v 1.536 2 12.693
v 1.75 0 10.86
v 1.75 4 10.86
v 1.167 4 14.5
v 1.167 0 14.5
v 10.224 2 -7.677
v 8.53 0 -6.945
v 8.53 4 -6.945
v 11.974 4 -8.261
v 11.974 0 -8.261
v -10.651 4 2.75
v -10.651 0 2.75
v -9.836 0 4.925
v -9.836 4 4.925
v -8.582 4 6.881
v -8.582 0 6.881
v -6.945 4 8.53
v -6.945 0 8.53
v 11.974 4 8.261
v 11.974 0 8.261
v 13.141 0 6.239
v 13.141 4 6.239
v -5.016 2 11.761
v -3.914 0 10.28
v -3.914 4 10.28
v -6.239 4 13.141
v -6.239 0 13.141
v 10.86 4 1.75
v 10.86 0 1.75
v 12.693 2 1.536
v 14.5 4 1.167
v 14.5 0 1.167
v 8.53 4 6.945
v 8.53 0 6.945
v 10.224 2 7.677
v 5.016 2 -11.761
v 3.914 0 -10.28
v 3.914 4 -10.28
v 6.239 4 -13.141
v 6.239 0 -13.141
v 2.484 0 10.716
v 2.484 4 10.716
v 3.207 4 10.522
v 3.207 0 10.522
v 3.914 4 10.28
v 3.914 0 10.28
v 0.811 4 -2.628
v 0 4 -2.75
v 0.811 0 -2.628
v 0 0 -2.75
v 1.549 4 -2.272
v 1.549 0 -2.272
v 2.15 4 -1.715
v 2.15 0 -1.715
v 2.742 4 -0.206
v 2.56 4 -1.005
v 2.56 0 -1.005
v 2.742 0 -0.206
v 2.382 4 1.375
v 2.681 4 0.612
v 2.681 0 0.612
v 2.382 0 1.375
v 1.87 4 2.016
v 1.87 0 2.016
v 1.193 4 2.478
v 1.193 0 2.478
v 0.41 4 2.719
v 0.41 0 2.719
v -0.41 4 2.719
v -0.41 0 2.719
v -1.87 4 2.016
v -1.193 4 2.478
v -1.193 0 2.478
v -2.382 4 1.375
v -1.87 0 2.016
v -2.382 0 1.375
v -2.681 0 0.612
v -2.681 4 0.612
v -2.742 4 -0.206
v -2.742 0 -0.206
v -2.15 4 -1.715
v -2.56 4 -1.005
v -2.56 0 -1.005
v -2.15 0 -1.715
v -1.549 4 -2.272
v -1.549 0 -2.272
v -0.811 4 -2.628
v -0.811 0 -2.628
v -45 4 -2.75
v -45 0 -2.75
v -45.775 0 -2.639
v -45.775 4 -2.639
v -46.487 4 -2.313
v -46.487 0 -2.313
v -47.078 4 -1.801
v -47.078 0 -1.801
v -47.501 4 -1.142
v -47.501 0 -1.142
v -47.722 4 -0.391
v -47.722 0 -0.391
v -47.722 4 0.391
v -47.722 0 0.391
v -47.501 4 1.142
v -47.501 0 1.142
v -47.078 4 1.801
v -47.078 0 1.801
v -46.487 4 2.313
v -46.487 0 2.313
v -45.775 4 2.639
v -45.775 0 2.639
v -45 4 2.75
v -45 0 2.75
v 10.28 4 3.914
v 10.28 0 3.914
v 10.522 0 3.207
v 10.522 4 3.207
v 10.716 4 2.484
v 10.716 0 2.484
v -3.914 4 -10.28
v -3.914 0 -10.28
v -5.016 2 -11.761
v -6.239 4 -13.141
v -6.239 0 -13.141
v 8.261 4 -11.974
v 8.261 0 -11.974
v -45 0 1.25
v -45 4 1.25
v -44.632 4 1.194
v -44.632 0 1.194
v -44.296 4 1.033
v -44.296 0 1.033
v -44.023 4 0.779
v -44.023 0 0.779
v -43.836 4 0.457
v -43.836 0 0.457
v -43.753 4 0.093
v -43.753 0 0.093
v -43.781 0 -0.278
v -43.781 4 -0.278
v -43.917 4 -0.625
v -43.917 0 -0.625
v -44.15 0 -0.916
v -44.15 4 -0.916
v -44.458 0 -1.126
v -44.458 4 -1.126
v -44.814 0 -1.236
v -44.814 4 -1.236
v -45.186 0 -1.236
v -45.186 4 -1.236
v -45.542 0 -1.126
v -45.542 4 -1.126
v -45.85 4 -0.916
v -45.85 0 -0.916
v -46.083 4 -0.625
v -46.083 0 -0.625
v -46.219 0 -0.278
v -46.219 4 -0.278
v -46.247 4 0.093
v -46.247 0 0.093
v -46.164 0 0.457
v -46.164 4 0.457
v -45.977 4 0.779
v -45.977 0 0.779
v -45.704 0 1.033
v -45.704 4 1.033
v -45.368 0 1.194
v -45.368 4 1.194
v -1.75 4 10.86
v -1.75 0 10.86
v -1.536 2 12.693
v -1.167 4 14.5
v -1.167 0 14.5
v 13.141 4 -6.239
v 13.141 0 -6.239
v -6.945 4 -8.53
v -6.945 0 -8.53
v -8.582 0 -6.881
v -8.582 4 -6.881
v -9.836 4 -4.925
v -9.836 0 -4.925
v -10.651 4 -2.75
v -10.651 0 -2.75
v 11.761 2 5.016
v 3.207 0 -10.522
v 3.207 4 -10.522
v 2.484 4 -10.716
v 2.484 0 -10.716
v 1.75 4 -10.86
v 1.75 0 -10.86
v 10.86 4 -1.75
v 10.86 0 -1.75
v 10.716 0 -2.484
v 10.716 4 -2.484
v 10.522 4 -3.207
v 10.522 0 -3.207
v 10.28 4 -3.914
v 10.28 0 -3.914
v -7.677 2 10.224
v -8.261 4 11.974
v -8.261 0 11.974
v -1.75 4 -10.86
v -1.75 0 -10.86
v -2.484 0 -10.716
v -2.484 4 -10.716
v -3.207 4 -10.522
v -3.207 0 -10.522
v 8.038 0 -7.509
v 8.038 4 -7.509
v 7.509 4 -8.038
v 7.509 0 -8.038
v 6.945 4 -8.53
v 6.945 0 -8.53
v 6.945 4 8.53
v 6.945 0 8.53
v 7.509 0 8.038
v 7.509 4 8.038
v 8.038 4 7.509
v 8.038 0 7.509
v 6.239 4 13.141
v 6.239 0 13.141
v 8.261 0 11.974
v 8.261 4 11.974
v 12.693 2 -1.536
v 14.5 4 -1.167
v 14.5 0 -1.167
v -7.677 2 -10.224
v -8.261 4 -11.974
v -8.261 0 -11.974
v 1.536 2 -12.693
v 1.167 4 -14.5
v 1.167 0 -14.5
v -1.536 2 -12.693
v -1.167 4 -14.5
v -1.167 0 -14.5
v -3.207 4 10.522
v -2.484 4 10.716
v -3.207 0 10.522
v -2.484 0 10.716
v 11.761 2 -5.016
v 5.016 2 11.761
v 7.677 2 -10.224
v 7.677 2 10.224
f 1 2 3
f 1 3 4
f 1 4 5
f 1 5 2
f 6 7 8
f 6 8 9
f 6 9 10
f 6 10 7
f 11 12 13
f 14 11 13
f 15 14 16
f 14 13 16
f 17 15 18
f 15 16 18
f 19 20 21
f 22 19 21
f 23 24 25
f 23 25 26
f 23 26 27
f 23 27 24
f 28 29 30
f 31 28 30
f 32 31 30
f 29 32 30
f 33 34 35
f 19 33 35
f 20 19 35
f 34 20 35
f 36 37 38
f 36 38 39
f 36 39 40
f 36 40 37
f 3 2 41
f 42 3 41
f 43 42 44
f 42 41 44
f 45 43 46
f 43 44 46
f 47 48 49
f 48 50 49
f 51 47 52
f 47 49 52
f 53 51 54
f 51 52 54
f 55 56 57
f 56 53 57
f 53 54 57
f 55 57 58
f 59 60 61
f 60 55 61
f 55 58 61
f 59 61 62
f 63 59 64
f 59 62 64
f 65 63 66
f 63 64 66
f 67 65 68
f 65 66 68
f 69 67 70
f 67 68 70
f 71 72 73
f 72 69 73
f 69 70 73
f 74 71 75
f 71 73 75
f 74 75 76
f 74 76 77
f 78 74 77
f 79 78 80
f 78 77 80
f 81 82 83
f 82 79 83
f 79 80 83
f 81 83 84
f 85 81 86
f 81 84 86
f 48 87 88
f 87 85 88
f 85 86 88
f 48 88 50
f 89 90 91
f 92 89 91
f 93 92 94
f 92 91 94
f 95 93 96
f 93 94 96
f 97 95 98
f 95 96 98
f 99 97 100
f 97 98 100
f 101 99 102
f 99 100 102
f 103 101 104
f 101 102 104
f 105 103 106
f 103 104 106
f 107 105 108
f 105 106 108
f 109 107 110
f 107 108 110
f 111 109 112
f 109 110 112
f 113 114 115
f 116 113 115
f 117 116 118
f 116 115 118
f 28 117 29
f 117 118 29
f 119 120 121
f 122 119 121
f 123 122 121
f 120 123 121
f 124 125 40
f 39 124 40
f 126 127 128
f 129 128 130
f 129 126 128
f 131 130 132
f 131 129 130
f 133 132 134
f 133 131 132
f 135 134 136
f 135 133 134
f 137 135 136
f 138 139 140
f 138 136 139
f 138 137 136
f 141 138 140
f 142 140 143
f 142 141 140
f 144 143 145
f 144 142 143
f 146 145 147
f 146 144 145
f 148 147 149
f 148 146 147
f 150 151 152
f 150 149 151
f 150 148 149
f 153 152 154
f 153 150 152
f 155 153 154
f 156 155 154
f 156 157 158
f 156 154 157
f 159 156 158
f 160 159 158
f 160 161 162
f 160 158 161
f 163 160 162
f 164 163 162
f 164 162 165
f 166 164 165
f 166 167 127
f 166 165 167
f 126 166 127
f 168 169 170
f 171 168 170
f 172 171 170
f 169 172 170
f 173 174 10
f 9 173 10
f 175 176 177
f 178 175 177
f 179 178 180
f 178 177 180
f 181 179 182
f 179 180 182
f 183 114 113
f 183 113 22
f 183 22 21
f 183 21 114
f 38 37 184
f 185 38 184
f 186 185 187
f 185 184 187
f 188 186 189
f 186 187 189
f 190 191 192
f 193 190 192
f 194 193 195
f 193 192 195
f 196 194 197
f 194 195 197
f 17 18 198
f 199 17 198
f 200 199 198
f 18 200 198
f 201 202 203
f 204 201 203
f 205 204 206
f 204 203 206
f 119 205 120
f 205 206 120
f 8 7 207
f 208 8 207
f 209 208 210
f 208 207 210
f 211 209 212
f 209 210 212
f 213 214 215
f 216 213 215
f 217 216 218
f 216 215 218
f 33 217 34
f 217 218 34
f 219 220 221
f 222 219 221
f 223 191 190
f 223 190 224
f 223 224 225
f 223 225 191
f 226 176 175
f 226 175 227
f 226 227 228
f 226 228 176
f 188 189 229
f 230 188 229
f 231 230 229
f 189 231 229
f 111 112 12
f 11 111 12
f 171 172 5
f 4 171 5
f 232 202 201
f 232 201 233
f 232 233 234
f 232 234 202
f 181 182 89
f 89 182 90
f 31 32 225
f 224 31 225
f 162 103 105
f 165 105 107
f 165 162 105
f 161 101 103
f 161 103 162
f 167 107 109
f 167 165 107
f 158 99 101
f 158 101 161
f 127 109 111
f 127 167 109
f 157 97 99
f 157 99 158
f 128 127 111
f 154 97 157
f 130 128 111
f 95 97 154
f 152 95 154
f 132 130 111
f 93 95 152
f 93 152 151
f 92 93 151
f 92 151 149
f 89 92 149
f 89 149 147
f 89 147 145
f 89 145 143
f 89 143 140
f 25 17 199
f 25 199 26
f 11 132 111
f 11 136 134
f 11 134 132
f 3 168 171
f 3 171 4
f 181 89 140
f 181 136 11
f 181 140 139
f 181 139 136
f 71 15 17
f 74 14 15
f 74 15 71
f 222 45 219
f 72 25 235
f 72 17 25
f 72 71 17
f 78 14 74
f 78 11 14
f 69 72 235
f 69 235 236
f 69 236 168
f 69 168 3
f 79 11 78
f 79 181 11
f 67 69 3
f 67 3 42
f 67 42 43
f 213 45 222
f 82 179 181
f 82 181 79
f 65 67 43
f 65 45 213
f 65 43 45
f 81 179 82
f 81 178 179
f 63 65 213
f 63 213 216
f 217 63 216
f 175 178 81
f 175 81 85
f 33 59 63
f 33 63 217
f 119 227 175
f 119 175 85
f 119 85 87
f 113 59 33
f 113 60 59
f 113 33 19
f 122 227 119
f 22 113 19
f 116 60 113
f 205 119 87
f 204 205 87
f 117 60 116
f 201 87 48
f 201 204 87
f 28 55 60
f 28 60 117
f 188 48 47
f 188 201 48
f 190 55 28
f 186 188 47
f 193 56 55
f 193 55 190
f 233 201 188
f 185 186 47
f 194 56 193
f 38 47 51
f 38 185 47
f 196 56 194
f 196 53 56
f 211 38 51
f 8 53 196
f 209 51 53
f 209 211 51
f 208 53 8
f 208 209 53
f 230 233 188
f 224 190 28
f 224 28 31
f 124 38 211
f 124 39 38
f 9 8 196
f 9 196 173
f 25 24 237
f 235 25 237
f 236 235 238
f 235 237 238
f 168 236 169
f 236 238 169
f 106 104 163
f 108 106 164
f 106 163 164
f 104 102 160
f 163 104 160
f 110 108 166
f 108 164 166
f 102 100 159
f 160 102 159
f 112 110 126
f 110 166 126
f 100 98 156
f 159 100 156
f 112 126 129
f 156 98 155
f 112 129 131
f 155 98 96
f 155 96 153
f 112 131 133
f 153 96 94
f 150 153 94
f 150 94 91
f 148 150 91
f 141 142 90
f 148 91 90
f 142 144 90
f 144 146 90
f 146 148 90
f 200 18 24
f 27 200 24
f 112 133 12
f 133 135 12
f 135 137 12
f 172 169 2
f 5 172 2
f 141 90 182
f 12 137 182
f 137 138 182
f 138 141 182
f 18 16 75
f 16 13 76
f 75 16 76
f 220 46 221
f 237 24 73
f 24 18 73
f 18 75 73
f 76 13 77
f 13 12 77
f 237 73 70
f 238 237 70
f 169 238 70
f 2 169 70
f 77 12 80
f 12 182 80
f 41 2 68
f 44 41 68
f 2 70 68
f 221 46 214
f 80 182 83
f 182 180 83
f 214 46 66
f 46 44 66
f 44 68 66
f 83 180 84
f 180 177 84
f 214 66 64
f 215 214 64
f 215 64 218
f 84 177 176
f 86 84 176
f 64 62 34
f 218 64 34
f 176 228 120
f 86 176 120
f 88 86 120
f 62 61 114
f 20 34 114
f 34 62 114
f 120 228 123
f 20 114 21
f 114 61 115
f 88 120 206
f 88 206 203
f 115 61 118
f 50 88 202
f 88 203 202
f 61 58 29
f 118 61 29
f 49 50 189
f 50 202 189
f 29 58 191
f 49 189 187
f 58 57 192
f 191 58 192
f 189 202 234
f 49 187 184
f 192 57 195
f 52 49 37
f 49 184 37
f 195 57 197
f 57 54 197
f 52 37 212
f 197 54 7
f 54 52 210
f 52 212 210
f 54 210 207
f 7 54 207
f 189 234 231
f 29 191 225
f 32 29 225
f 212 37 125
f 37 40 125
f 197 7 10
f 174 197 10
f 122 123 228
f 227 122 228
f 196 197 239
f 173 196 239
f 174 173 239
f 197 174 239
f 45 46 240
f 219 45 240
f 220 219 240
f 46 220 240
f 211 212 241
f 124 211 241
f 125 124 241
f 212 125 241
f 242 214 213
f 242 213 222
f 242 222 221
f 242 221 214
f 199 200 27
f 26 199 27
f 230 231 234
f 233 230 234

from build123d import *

# Parameters (mm, degrees)
BOSS_EXTRUDE1_DEPTH            = 4
BOSS_EXTRUDE1_2_DEPTH          = 4
SKETCH3_R                      = 2.75
CUT_EXTRUDE5_DEPTH             = 10
BOSS_EXTRUDE2_DEPTH            = 4
SKETCH6_R                      = 1.25
CUT_EXTRUDE4_DEPTH             = 30
BODY_DELETE_KEEP_2_OUTLINE_R   = 2.75
BODY_DELETE_KEEP_2_OUTLINE_R_2 = 1.25
BODY_DELETE_KEEP_2_DEPTH       = 4


# Read off the part's stored shape, not the designer's step: Body-Delete/Keep 2
with BuildPart() as part:
    # Sketch1 → Boss-Extrude1 (new body)
    with BuildSketch(Plane(origin=(0, 0, 0), x_dir=(1, 0, 0), z_dir=(0, 1, 0))):
        with BuildLine():
            Line((1.167045764, 14.5), (-1.167045764, 14.5))
            add(Edge.make_bspline(
                [(-1.75, 10.859903314), (-1.614394474, 12.705744996), (-1.167045764, 14.5)],
                knots=[0, 0, 0, 1, 1, 1], degree=2))
            ThreePointArc((-1.75, 10.859903314), (-2.847009496, 10.625184089), (-3.914407201, 10.279952153))
            add(Edge.make_bspline(
                [(-3.914407201, 10.279952153), (-4.954765872, 11.810695178), (-6.239308721, 13.140891237)],
                knots=[0, 0, 0, 1, 1, 1], degree=2))
            Line((-6.239308721, 13.140891237), (-8.260691279, 11.973845473))
            add(Edge.make_bspline(
                [(-6.945496114, 8.529952153), (-7.750979124, 10.196300704), (-8.260691279, 11.973845473)],
                knots=[0, 0, 0, 1, 1, 1], degree=2))
            ThreePointArc((-6.945496114, 8.529952153), (-11, 0), (-6.945496114, -8.529952153))
            add(Edge.make_bspline(
                [(-6.945496114, -8.529952153), (-7.750979124, -10.196300704), (-8.260691279, -11.973845473)],
                knots=[0, 0, 0, 1, 1, 1], degree=2))
            Line((-8.260691279, -11.973845473), (-6.239308721, -13.140891237))
            add(Edge.make_bspline(
                [(-3.914407201, -10.279952153), (-4.954765872, -11.810695178), (-6.239308721, -13.140891237)],
                knots=[0, 0, 0, 1, 1, 1], degree=2))
            ThreePointArc((-3.914407201, -10.279952153), (-2.847009496, -10.625184089), (-1.75, -10.859903314))
            add(Edge.make_bspline(
                [(-1.75, -10.859903314), (-1.614394474, -12.705744996), (-1.167045764, -14.5)],
                knots=[0, 0, 0, 1, 1, 1], degree=2))
            Line((-1.167045764, -14.5), (1.167045764, -14.5))
            add(Edge.make_bspline(
                [(1.75, -10.859903314), (1.614394474, -12.705744996), (1.167045764, -14.5)],
                knots=[0, 0, 0, 1, 1, 1], degree=2))
            ThreePointArc((1.75, -10.859903314), (2.847009496, -10.625184089), (3.914407201, -10.279952153))
            add(Edge.make_bspline(
                [(3.914407201, -10.279952153), (4.954765872, -11.810695178), (6.239308721, -13.140891237)],
                knots=[0, 0, 0, 1, 1, 1], degree=2))
            Line((6.239308721, -13.140891237), (8.260691279, -11.973845473))
            add(Edge.make_bspline(
                [(6.945496114, -8.529952153), (7.750979124, -10.196300704), (8.260691279, -11.973845473)],
                knots=[0, 0, 0, 1, 1, 1], degree=2))
            ThreePointArc((6.945496114, -8.529952153), (7.778174593, -7.778174593), (8.529952153, -6.945496114))
            add(Edge.make_bspline(
                [(8.529952153, -6.945496114), (10.196300704, -7.750979124), (11.973845473, -8.260691279)],
                knots=[0, 0, 0, 1, 1, 1], degree=2))
            Line((11.973845473, -8.260691279), (13.140891237, -6.239308721))
            add(Edge.make_bspline(
                [(10.279952153, -3.914407201), (11.810695178, -4.954765872), (13.140891237, -6.239308721)],
                knots=[0, 0, 0, 1, 1, 1], degree=2))
            ThreePointArc((10.279952153, -3.914407201), (10.625184089, -2.847009496), (10.859903314, -1.75))
            add(Edge.make_bspline(
                [(10.859903314, -1.75), (12.705744996, -1.614394474), (14.5, -1.167045764)],
                knots=[0, 0, 0, 1, 1, 1], degree=2))
            Line((14.5, -1.167045764), (14.5, 1.167045764))
            add(Edge.make_bspline(
                [(10.859903314, 1.75), (12.705744996, 1.614394474), (14.5, 1.167045764)],
                knots=[0, 0, 0, 1, 1, 1], degree=2))
            ThreePointArc((10.859903314, 1.75), (10.625184089, 2.847009496), (10.279952153, 3.914407201))
            add(Edge.make_bspline(
                [(10.279952153, 3.914407201), (11.810695178, 4.954765872), (13.140891237, 6.239308721)],
                knots=[0, 0, 0, 1, 1, 1], degree=2))
            Line((13.140891237, 6.239308721), (11.973845473, 8.260691279))
            add(Edge.make_bspline(
                [(8.529952153, 6.945496114), (10.196300704, 7.750979124), (11.973845473, 8.260691279)],
                knots=[0, 0, 0, 1, 1, 1], degree=2))
            ThreePointArc((8.529952153, 6.945496114), (7.778174593, 7.778174593), (6.945496114, 8.529952153))
            add(Edge.make_bspline(
                [(6.945496114, 8.529952153), (7.750979124, 10.196300704), (8.260691279, 11.973845473)],
                knots=[0, 0, 0, 1, 1, 1], degree=2))
            Line((8.260691279, 11.973845473), (6.239308721, 13.140891237))
            add(Edge.make_bspline(
                [(3.914407201, 10.279952153), (4.954765872, 11.810695178), (6.239308721, 13.140891237)],
                knots=[0, 0, 0, 1, 1, 1], degree=2))
            ThreePointArc((3.914407201, 10.279952153), (2.847009496, 10.625184089), (1.75, 10.859903314))
            add(Edge.make_bspline(
                [(1.75, 10.859903314), (1.614394474, 12.705744996), (1.167045764, 14.5)],
                knots=[0, 0, 0, 1, 1, 1], degree=2))
        make_face()
    extrude(amount=BOSS_EXTRUDE1_DEPTH)


with BuildPart() as body_2:
    # Sketch1 → Boss-Extrude1 2 (new body)
    with BuildSketch(Plane(origin=(0, 0, 0), x_dir=(1, 0, 0), z_dir=(0, 1, 0))):
        with BuildLine():
            add(Edge.make_bspline(
                [(34.870054214, 9.863192787), (35.186170623, 11.683486975), (35.362460844, 13.522249764)],
                knots=[0, 0, 0, 1, 1, 1], degree=2))
            Line((35.362460844, 13.522249764), (33.134723393, 14.204954567))
            add(Edge.make_bspline(
                [(31.5252137, 10.893746976), (32.106045864, 12.660345794), (33.134723393, 14.204954567)],
                knots=[0, 0, 0, 1, 1, 1], degree=2))
            ThreePointArc((31.5252137, 10.893746976), (30.40772436, 10.992441078), (29.285994273, 10.976802623))
            add(Edge.make_bspline(
                [(29.285994273, 10.976802623), (28.64961202, 12.711281837), (27.882902436, 14.391842235)],
                knots=[0, 0, 0, 1, 1, 1], degree=2))
            Line((27.882902436, 14.391842235), (25.612272809, 13.869213211))
            add(Edge.make_bspline(
                [(25.874000322, 10.196868473), (25.493716323, 12.01720401), (25.612272809, 13.869213211)],
                knots=[0, 0, 0, 1, 1, 1], degree=2))
            ThreePointArc((25.874000322, 10.196868473), (24.856879115, 9.723595403), (23.893251591, 9.14918706))
            add(Edge.make_bspline(
                [(23.893251591, 9.14918706), (22.474888786, 10.333098996), (20.97061861, 11.4051522)],
                knots=[0, 0, 0, 1, 1, 1], degree=2))
            Line((20.97061861, 11.4051522), (19.265510182, 9.817227376))
            add(Edge.make_bspline(
                [(21.328345227, 6.767747298), (20.088841854, 8.154062117), (19.265510182, 9.817227376)],
                knots=[0, 0, 0, 1, 1, 1], degree=2))
            ThreePointArc((21.328345227, 6.767747298), (20.684128957, 5.849320193), (20.136807213, 4.870054214))
            add(Edge.make_bspline(
                [(20.136807213, 4.870054214), (18.316513025, 5.186170623), (16.477750236, 5.362460844)],
                knots=[0, 0, 0, 1, 1, 1], degree=2))
            Line((16.477750236, 5.362460844), (15.795045433, 3.134723393))
            add(Edge.make_bspline(
                [(19.106253024, 1.5252137), (17.339654206, 2.106045864), (15.795045433, 3.134723393)],
                knots=[0, 0, 0, 1, 1, 1], degree=2))
            ThreePointArc((19.106253024, 1.5252137), (19.007558922, 0.40772436), (19.023197377, -0.714005727))
            add(Edge.make_bspline(
                [(19.023197377, -0.714005727), (17.288718163, -1.35038798), (15.608157765, -2.117097564)],
                knots=[0, 0, 0, 1, 1, 1], degree=2))
            Line((15.608157765, -2.117097564), (16.130786789, -4.387727191))
            add(Edge.make_bspline(
                [(19.803131527, -4.125999678), (17.98279599, -4.506283677), (16.130786789, -4.387727191)],
                knots=[0, 0, 0, 1, 1, 1], degree=2))
            ThreePointArc((19.803131527, -4.125999678), (20.276404597, -5.143120885), (20.85081294, -6.106748409))
            add(Edge.make_bspline(
                [(20.85081294, -6.106748409), (19.666901004, -7.525111214), (18.5948478, -9.02938139)],
                knots=[0, 0, 0, 1, 1, 1], degree=2))
            Line((18.5948478, -9.02938139), (20.182772624, -10.734489818))
            add(Edge.make_bspline(
                [(23.232252702, -8.671654773), (21.845937883, -9.911158146), (20.182772624, -10.734489818)],
                knots=[0, 0, 0, 1, 1, 1], degree=2))
            ThreePointArc((23.232252702, -8.671654773), (24.150679807, -9.315871043), (25.129945786, -9.863192787))
            add(Edge.make_bspline(
                [(25.129945786, -9.863192787), (24.813829377, -11.683486975), (24.637539156, -13.522249764)],
                knots=[0, 0, 0, 1, 1, 1], degree=2))
            Line((24.637539156, -13.522249764), (26.865276607, -14.204954567))
            add(Edge.make_bspline(
                [(28.4747863, -10.893746976), (27.893954136, -12.660345794), (26.865276607, -14.204954567)],
                knots=[0, 0, 0, 1, 1, 1], degree=2))
            ThreePointArc((28.4747863, -10.893746976), (29.59227564, -10.992441078), (30.714005727, -10.976802623))
            add(Edge.make_bspline(
                [(30.714005727, -10.976802623), (31.35038798, -12.711281837), (32.117097564, -14.391842235)],
                knots=[0, 0, 0, 1, 1, 1], degree=2))
            Line((32.117097564, -14.391842235), (34.387727191, -13.869213211))
            add(Edge.make_bspline(
                [(34.125999678, -10.196868473), (34.506283677, -12.01720401), (34.387727191, -13.869213211)],
                knots=[0, 0, 0, 1, 1, 1], degree=2))
            ThreePointArc((34.125999678, -10.196868473), (35.143120885, -9.723595403), (36.106748409, -9.14918706))
            add(Edge.make_bspline(
                [(36.106748409, -9.14918706), (37.525111214, -10.333098996), (39.02938139, -11.4051522)],
                knots=[0, 0, 0, 1, 1, 1], degree=2))
            Line((39.02938139, -11.4051522), (40.734489818, -9.817227376))
            add(Edge.make_bspline(
                [(38.671654773, -6.767747298), (39.911158146, -8.154062117), (40.734489818, -9.817227376)],
                knots=[0, 0, 0, 1, 1, 1], degree=2))
            ThreePointArc((38.671654773, -6.767747298), (40.723409561, 2.451221613), (34.870054214, 9.863192787))
        make_face()
    extrude(amount=BOSS_EXTRUDE1_2_DEPTH)


with BuildPart() as cut_extrude5_tool:
    # Sketch3 → Cut-Extrude5 (new body)
    with BuildSketch(Plane(origin=(0, 0, 0), x_dir=(-1, 0, 0), z_dir=(0, -1, 0))):
        with Locations(Location((0, 0, 0), (0, 0, 90))):
            Circle(SKETCH3_R)
        with Locations(Location((-30, 0, 0), (0, 0, 90))):
            Circle(SKETCH3_R)
    extrude(amount=-CUT_EXTRUDE5_DEPTH)


with BuildPart() as part_1:
    add(part.part)

    # Cut-Extrude5: cut by cut_extrude5_tool
    add(cut_extrude5_tool.part, mode=Mode.SUBTRACT)



with BuildPart() as body_2_1:
    add(body_2.part)

    # Cut-Extrude5: cut by cut_extrude5_tool
    add(cut_extrude5_tool.part, mode=Mode.SUBTRACT)


with BuildPart() as part_2:
    add(part_1.part)

    add(body_2_1.part)  # Boss-Extrude2 merges body 2
    # Sketch4 → Boss-Extrude2 (add)
    with BuildSketch(Plane(origin=(0, 0, 0), x_dir=(1, 0, 0), z_dir=(0, 1, 0))):
        with BuildLine():
            Line((0, 2.75), (-45, 2.75))
            ThreePointArc((-45, 2.75), (-47.75, 0), (-45, -2.75))
            Line((-45, -2.75), (0, -2.75))
            ThreePointArc((0, -2.75), (-2.75, 0), (0, 2.75))
        make_face()
        with BuildLine():
            Line((75, -2.75), (30, -2.75))
            ThreePointArc((30, -2.75), (32.75, 0), (30, 2.75))
            Line((30, 2.75), (75, 2.75))
            ThreePointArc((75, 2.75), (77.75, 0), (75, -2.75))
        make_face()
    extrude(amount=BOSS_EXTRUDE2_DEPTH)

    # Sketch6 → Cut-Extrude4 (cut)
    with BuildSketch(Plane(origin=(0, 0, 0), x_dir=(1, 0, 0), z_dir=(0, 1, 0))):
        with Locations(Location((-45, 0, 0), (0, 0, 270))):
            Circle(SKETCH6_R)
        with Locations(Location((75, 0, 0), (0, 0, 270))):
            Circle(SKETCH6_R)
    extrude(amount=CUT_EXTRUDE4_DEPTH, mode=Mode.SUBTRACT)

    # Body-Delete/Keep 2 outline → Body-Delete/Keep 2 (cut)
    with BuildSketch(Plane(origin=(0, 0, 0), x_dir=(1, 0, 0), z_dir=(0, 1, 0))):
        with BuildLine():
            ThreePointArc((25.874000322, 10.196868473), (24.856879115, 9.723595403), (23.893251591, 9.14918706))
            add(Edge.make_bspline(
                [(23.893251591, 9.14918706), (22.474888786, 10.333098996), (20.97061861, 11.4051522)],
                knots=[0, 0, 0, 1, 1, 1], degree=2))
            Line((20.97061861, 11.4051522), (19.265510182, 9.817227376))
            add(Edge.make_bspline(
                [(21.328345227, 6.767747298), (20.088841854, 8.154062117), (19.265510182, 9.817227376)],
                knots=[0, 0, 0, 1, 1, 1], degree=2))
            ThreePointArc((21.328345227, 6.767747298), (20.684128957, 5.849320193), (20.136807213, 4.870054214))
            add(Edge.make_bspline(
                [(20.136807213, 4.870054214), (18.316513025, 5.186170623), (16.477750236, 5.362460844)],
                knots=[0, 0, 0, 1, 1, 1], degree=2))
            Line((16.477750236, 5.362460844), (15.795045433, 3.134723393))
            add(Edge.make_bspline(
                [(19.106253024, 1.5252137), (17.339654206, 2.106045864), (15.795045433, 3.134723393)],
                knots=[0, 0, 0, 1, 1, 1], degree=2))
            ThreePointArc((19.106253024, 1.5252137), (19.007558922, 0.40772436), (19.023197377, -0.714005727))
            add(Edge.make_bspline(
                [(19.023197377, -0.714005727), (17.288718163, -1.35038798), (15.608157765, -2.117097564)],
                knots=[0, 0, 0, 1, 1, 1], degree=2))
            Line((15.608157765, -2.117097564), (16.130786789, -4.387727191))
            add(Edge.make_bspline(
                [(19.803131527, -4.125999678), (17.98279599, -4.506283677), (16.130786789, -4.387727191)],
                knots=[0, 0, 0, 1, 1, 1], degree=2))
            ThreePointArc((19.803131527, -4.125999678), (20.276404597, -5.143120885), (20.85081294, -6.106748409))
            add(Edge.make_bspline(
                [(20.85081294, -6.106748409), (19.666901004, -7.525111214), (18.5948478, -9.02938139)],
                knots=[0, 0, 0, 1, 1, 1], degree=2))
            Line((18.5948478, -9.02938139), (20.182772624, -10.734489818))
            add(Edge.make_bspline(
                [(23.232252702, -8.671654773), (21.845937883, -9.911158146), (20.182772624, -10.734489818)],
                knots=[0, 0, 0, 1, 1, 1], degree=2))
            ThreePointArc((23.232252702, -8.671654773), (24.150679807, -9.315871043), (25.129945786, -9.863192787))
            add(Edge.make_bspline(
                [(25.129945786, -9.863192787), (24.813829377, -11.683486975), (24.637539156, -13.522249764)],
                knots=[0, 0, 0, 1, 1, 1], degree=2))
            Line((24.637539156, -13.522249764), (26.865276607, -14.204954567))
            add(Edge.make_bspline(
                [(28.4747863, -10.893746976), (27.893954136, -12.660345794), (26.865276607, -14.204954567)],
                knots=[0, 0, 0, 1, 1, 1], degree=2))
            ThreePointArc((28.4747863, -10.893746976), (29.59227564, -10.992441078), (30.714005727, -10.976802623))
            add(Edge.make_bspline(
                [(30.714005727, -10.976802623), (31.35038798, -12.711281837), (32.117097564, -14.391842235)],
                knots=[0, 0, 0, 1, 1, 1], degree=2))
            Line((32.117097564, -14.391842235), (34.387727191, -13.869213211))
            add(Edge.make_bspline(
                [(34.125999678, -10.196868473), (34.506283677, -12.01720401), (34.387727191, -13.869213211)],
                knots=[0, 0, 0, 1, 1, 1], degree=2))
            ThreePointArc((34.125999678, -10.196868473), (35.143120885, -9.723595403), (36.106748409, -9.14918706))
            add(Edge.make_bspline(
                [(36.106748409, -9.14918706), (37.525111214, -10.333098996), (39.02938139, -11.4051522)],
                knots=[0, 0, 0, 1, 1, 1], degree=2))
            Line((39.02938139, -11.4051522), (40.734489818, -9.817227376))
            add(Edge.make_bspline(
                [(38.671654773, -6.767747298), (39.911158146, -8.154062117), (40.734489818, -9.817227376)],
                knots=[0, 0, 0, 1, 1, 1], degree=2))
            ThreePointArc((38.671654773, -6.767747298), (39.867824605, -4.860662256), (40.650704202, -2.75))
            Line((40.650704202, -2.75), (75, -2.75))
            ThreePointArc((75, -2.75), (77.75, 0), (75, 2.75))
            Line((75, 2.75), (40.650704202, 2.75))
            ThreePointArc((40.650704202, 2.75), (38.536560394, 6.93737246), (34.870054214, 9.863192787))
            add(Edge.make_bspline(
                [(34.870054214, 9.863192787), (35.186170623, 11.683486975), (35.362460844, 13.522249764)],
                knots=[0, 0, 0, 1, 1, 1], degree=2))
            Line((35.362460844, 13.522249764), (33.134723393, 14.204954567))
            add(Edge.make_bspline(
                [(31.5252137, 10.893746976), (32.106045864, 12.660345794), (33.134723393, 14.204954567)],
                knots=[0, 0, 0, 1, 1, 1], degree=2))
            ThreePointArc((31.5252137, 10.893746976), (30.40772436, 10.992441078), (29.285994273, 10.976802623))
            add(Edge.make_bspline(
                [(29.285994273, 10.976802623), (28.64961202, 12.711281837), (27.882902436, 14.391842235)],
                knots=[0, 0, 0, 1, 1, 1], degree=2))
            Line((27.882902436, 14.391842235), (25.612272809, 13.869213211))
            add(Edge.make_bspline(
                [(25.874000322, 10.196868473), (25.493716323, 12.01720401), (25.612272809, 13.869213211)],
                knots=[0, 0, 0, 1, 1, 1], degree=2))
        make_face()
        with Locations((30, 0)):
            Circle(BODY_DELETE_KEEP_2_OUTLINE_R, mode=Mode.SUBTRACT)
        with Locations((75, 0)):
            Circle(BODY_DELETE_KEEP_2_OUTLINE_R_2, mode=Mode.SUBTRACT)
    extrude(amount=BODY_DELETE_KEEP_2_DEPTH, mode=Mode.SUBTRACT)


solid = part_2.part
